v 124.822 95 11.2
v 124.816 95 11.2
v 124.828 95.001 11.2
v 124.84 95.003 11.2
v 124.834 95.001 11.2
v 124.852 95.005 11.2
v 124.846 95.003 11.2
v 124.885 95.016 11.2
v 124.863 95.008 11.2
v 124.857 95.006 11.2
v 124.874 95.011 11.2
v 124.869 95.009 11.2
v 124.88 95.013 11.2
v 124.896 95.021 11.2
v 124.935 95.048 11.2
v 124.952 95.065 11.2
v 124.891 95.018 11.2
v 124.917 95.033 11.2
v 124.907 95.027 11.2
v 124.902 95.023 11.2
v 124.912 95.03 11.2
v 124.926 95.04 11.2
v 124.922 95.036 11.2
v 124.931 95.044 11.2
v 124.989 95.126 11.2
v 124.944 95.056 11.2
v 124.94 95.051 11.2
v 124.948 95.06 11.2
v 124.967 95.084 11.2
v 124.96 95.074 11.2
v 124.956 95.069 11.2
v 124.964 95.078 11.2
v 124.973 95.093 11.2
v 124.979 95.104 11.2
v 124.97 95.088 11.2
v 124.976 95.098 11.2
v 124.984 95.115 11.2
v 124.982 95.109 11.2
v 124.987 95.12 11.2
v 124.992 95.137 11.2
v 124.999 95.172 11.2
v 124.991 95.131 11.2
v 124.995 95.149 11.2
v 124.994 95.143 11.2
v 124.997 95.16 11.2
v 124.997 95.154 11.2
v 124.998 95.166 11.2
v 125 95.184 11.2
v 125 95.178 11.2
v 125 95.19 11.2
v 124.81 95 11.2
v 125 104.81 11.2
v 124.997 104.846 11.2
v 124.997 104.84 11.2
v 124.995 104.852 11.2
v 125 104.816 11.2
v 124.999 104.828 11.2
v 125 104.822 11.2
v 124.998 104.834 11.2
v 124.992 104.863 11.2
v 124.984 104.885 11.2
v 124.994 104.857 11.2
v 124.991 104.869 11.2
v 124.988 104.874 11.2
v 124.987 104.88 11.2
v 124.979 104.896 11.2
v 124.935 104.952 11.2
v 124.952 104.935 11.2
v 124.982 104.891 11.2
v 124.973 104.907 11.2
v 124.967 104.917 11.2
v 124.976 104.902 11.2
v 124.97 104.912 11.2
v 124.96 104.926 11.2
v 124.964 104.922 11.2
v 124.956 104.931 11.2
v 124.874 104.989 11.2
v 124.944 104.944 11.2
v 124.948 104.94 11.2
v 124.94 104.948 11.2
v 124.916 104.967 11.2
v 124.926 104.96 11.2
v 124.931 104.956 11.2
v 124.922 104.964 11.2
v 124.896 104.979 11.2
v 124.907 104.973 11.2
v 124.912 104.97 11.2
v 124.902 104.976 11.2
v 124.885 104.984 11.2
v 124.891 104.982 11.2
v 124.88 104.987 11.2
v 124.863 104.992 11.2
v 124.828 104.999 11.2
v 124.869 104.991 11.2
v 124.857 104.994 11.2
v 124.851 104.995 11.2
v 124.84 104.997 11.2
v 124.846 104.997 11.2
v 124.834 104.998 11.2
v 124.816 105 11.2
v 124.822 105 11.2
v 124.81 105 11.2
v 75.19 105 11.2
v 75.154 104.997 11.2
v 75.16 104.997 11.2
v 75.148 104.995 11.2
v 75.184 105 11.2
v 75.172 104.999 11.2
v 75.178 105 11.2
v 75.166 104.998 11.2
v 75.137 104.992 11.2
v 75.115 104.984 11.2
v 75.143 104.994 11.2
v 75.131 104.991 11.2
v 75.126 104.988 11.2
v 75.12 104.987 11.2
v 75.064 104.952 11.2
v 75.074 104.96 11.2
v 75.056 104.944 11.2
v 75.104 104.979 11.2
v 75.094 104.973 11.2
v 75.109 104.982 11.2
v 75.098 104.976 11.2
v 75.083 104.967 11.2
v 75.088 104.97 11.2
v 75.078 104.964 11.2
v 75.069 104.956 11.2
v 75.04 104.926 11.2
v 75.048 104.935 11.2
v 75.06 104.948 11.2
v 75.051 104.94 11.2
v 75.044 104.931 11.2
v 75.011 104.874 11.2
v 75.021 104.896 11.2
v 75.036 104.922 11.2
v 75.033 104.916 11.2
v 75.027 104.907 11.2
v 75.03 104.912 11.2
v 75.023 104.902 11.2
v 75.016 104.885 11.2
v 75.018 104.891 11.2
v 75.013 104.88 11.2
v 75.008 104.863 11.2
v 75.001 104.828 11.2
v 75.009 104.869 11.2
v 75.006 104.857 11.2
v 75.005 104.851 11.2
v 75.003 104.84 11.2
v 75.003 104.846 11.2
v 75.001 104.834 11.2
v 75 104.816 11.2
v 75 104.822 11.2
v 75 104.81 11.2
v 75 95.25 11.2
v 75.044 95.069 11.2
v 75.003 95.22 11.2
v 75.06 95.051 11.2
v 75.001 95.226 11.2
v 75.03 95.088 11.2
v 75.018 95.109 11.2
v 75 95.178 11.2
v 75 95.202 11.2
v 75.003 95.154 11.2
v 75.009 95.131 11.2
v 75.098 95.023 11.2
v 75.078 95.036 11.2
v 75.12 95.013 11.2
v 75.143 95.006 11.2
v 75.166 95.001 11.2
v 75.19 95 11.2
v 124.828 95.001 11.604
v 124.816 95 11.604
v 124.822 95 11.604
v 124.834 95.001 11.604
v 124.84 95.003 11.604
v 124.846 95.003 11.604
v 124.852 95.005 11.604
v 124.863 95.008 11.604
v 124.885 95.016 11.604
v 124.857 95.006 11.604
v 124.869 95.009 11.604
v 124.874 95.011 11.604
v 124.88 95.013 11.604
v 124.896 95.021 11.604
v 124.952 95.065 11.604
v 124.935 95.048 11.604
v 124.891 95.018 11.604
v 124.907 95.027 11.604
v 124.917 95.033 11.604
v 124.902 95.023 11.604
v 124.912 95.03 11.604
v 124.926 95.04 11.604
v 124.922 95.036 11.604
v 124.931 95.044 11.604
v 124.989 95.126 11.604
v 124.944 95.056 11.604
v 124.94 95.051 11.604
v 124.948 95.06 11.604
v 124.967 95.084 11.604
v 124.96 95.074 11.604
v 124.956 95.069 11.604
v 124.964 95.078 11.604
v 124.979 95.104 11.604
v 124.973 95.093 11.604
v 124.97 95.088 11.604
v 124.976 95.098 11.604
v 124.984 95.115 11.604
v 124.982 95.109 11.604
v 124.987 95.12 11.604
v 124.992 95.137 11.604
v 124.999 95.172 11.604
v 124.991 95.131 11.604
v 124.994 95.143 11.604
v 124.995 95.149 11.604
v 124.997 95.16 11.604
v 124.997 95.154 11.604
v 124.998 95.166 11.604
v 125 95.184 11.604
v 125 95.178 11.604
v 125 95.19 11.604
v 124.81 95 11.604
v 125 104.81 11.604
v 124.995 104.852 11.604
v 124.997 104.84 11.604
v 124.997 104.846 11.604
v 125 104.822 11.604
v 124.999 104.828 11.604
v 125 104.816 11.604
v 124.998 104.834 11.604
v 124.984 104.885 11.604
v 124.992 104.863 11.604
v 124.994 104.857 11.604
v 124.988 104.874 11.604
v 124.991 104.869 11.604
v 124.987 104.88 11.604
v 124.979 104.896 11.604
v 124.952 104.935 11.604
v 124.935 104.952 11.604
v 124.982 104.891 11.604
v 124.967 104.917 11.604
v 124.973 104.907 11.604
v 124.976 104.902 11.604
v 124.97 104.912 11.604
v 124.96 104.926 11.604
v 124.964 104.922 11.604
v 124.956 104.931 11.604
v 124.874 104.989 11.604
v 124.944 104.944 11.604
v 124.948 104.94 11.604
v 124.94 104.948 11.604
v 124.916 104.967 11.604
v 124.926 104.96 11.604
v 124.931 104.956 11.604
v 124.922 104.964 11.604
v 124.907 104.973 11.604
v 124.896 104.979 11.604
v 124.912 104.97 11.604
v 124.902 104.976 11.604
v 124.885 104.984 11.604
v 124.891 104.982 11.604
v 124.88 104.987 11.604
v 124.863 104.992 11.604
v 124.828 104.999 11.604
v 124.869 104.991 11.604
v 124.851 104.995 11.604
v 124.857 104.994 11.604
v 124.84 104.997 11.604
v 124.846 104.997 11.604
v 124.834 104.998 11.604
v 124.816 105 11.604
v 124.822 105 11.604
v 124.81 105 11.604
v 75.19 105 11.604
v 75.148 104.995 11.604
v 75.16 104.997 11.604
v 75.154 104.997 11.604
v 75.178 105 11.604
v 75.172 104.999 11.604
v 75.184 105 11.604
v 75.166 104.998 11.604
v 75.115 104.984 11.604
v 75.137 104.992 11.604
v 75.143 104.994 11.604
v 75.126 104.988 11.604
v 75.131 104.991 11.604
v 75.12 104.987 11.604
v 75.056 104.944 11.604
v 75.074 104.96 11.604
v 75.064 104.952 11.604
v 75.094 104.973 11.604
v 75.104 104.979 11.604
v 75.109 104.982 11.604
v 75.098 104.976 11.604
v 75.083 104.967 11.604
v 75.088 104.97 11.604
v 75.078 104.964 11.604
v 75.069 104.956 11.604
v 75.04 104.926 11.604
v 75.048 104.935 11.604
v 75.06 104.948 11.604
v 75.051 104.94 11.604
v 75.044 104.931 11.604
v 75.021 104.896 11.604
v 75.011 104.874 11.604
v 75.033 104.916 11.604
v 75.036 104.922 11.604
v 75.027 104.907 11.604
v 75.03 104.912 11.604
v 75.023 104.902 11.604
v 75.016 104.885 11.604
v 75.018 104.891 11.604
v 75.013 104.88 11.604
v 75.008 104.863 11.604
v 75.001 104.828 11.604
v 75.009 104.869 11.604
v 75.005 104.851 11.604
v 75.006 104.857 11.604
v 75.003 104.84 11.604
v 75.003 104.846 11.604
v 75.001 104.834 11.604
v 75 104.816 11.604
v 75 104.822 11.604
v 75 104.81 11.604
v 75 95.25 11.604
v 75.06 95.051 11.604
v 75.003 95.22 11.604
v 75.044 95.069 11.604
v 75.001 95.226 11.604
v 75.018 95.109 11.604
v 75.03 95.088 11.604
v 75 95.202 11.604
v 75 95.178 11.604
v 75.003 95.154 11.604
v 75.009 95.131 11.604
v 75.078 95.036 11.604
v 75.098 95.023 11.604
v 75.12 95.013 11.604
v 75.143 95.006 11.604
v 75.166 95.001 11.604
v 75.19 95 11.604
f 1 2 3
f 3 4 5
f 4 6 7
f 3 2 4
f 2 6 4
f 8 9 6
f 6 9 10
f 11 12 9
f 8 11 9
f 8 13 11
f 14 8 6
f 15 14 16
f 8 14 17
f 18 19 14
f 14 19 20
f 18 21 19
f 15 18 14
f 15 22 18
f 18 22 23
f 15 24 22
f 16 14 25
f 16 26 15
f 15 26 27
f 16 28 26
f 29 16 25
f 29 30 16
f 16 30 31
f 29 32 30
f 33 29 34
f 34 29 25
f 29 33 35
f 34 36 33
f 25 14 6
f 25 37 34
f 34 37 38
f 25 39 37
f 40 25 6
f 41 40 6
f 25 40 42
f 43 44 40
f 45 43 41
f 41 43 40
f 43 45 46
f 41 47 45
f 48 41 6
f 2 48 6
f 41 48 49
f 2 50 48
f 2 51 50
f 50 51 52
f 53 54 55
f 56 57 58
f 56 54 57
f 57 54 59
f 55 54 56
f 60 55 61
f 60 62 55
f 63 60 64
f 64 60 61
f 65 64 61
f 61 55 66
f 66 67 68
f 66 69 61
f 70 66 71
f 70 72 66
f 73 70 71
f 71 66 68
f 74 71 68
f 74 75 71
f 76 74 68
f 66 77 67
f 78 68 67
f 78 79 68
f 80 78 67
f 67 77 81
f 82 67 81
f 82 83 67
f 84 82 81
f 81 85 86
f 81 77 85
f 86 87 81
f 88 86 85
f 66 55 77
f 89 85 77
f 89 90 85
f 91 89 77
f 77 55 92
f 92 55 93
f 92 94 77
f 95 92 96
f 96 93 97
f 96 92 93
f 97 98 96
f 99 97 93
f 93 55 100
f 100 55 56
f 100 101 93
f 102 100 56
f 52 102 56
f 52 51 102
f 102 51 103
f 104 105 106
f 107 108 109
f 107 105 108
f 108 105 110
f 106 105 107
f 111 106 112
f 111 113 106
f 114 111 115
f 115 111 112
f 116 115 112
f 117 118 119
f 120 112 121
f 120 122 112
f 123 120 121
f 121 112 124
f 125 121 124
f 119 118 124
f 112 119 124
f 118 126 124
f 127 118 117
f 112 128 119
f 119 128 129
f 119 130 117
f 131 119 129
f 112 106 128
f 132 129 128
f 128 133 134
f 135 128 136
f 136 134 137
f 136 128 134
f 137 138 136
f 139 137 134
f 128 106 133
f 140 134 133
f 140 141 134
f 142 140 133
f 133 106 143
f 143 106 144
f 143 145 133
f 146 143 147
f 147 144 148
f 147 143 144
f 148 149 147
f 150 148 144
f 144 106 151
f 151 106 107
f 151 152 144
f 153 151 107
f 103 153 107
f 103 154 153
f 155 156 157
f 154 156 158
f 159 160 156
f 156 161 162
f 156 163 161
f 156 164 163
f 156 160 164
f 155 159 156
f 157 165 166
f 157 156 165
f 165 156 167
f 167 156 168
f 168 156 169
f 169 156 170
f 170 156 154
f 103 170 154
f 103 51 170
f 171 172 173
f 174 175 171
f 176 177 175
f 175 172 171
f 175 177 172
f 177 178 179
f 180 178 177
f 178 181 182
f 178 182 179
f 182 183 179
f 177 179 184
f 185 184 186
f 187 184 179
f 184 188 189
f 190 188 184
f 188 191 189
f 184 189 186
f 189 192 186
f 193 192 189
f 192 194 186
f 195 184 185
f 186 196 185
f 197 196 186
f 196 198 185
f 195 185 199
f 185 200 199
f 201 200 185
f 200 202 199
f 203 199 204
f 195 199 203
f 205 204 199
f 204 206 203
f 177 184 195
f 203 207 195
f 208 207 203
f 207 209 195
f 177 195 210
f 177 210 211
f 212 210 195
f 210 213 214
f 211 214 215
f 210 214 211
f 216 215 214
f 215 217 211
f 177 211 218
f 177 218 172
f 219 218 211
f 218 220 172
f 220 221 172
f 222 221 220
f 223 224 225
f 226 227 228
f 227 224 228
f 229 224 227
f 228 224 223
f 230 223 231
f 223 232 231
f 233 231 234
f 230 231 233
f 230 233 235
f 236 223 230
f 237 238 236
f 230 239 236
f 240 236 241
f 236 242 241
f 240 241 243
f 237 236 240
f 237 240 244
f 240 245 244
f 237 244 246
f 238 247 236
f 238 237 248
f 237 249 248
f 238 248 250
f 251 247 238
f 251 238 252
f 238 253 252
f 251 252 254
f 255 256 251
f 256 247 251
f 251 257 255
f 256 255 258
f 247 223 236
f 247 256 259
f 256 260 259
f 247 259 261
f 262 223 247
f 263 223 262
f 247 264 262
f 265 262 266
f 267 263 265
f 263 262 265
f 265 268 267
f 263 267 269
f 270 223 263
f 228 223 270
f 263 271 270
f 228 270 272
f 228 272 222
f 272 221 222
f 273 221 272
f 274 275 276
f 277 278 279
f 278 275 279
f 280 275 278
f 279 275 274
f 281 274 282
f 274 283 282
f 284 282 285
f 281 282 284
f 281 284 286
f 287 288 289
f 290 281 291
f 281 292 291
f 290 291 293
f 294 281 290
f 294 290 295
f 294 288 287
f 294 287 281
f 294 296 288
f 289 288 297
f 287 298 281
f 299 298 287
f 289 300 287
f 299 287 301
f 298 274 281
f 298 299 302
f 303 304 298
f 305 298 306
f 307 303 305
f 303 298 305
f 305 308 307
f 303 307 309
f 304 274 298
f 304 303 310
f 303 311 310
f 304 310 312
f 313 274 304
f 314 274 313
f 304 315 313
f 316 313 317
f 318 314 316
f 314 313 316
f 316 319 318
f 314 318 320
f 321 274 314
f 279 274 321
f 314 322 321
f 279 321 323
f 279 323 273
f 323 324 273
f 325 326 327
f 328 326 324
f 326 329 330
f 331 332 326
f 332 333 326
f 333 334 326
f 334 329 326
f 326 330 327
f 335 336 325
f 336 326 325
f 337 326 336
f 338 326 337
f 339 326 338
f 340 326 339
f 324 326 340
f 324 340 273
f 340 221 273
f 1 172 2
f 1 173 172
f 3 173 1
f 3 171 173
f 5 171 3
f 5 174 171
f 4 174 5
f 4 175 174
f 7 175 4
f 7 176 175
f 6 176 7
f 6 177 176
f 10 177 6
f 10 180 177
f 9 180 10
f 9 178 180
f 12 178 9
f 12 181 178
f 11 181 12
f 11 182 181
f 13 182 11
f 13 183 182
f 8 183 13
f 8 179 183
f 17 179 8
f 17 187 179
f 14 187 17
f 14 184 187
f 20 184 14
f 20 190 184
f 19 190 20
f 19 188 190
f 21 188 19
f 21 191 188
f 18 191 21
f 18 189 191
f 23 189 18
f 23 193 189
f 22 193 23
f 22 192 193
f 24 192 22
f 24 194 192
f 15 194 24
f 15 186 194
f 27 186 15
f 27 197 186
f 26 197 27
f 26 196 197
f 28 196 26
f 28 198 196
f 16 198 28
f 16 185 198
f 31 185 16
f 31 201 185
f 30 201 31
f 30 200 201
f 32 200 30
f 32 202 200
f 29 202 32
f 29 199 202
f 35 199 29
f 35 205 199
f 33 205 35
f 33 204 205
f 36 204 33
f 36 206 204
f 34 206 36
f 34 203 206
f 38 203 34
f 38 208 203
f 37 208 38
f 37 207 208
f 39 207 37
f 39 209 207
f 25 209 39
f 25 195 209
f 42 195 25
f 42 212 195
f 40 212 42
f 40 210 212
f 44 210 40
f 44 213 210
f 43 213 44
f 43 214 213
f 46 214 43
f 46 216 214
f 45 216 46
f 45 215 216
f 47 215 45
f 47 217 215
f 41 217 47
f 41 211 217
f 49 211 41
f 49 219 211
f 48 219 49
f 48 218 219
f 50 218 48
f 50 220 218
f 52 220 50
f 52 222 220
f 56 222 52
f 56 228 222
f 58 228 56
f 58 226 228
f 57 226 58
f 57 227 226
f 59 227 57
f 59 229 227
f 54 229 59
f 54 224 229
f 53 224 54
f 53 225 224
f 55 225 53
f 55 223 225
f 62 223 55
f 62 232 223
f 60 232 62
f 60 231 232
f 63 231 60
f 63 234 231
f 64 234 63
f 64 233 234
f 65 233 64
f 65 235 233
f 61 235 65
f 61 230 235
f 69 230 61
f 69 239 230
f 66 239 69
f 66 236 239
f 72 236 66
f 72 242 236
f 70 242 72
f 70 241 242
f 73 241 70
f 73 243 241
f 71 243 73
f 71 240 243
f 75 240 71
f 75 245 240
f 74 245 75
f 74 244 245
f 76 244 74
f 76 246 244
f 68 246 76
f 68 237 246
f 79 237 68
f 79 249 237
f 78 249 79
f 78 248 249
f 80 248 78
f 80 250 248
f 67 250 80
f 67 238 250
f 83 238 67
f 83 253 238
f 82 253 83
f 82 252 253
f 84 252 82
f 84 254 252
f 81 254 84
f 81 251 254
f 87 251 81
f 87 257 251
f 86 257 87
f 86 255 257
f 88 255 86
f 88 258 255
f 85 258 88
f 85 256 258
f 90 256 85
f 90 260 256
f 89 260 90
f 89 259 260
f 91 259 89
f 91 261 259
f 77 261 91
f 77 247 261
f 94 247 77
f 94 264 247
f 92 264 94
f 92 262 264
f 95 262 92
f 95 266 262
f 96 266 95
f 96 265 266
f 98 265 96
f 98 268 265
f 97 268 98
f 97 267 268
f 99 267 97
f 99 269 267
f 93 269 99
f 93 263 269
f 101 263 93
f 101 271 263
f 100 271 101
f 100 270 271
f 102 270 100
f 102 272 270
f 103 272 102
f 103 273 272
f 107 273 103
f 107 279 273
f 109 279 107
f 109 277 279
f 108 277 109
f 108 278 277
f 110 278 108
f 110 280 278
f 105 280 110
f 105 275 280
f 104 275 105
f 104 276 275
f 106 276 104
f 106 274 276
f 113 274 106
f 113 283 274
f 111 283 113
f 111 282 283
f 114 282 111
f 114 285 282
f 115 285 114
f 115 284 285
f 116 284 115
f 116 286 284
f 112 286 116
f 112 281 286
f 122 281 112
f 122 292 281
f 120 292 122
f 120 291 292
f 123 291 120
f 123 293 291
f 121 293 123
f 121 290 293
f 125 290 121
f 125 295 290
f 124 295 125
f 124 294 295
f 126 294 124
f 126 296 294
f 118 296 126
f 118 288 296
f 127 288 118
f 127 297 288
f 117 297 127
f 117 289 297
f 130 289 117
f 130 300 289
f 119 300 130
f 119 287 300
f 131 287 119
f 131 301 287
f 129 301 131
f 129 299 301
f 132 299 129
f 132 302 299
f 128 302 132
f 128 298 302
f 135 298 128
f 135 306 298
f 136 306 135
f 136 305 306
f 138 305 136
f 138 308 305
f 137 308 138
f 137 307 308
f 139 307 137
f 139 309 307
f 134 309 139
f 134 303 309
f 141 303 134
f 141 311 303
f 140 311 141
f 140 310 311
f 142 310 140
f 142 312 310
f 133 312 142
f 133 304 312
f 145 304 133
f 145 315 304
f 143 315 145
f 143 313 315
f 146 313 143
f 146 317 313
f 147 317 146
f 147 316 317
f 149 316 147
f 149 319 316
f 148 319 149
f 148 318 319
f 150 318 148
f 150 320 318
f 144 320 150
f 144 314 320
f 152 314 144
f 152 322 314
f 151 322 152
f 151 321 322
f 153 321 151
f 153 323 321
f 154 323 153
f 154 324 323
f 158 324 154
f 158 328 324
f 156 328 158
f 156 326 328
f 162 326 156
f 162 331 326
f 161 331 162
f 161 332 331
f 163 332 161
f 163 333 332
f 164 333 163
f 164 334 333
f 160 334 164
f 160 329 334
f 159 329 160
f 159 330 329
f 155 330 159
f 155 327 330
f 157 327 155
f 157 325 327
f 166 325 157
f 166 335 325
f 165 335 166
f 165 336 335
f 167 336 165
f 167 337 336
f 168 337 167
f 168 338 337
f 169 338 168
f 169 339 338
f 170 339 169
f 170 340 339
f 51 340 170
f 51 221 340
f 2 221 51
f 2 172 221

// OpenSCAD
module drawBasicShape(x1, y1, x2, y2, width)
{
	length = sqrt((x1-x2)*(x1-x2) + (y1-y2)*(y1-y2));
	if (width!=0.0) {
		square(size = [width, length], center = false);
		translate([width/2.0, 0, 0]) circle(d=width);
		translate([width/2.0, length, 0]) circle(d=width);
	}
}

module translateAndRotate(x1, y1, x2, y2, width)
{
	if (width != 0.0) {
		angle = atan((y2-y1)/(x2-x1)) +270;
		if (x2>=x1) {
			translate([x1, y1, 0.0]) rotate([0.0, 0.0, angle]) translate([-width/2.0, 0.0, 0.0]) scale([1.0, 1.0, 1.0]) drawBasicShape(x1, y1, x2, y2, width);
		}
		else {
			translate([x1, y1, 0.0]) rotate([0.0, 0.0, angle+180]) translate([-width/2.0, 0.0, 0.0]) scale([1.0, 1.0, 1.0]) drawBasicShape(x1, y1, x2, y2, width);		}
	}
}

$fn=50;

points27 = [
[75.77800000, 95.77800000, 0.00000000],
[124.22200000, 95.77800000, 0.37999672],
[124.22200000, 104.22200000, 0.37997788],
[75.77800000, 104.22200000, 0.37999548],
[75.77800000, 95.83800000, 0.37998140],
[75.48400000, 95.48400000, 0.00000000],
[124.51600000, 95.48400000, 0.37999746],
[124.51600000, 104.51600000, 0.37998977],
[75.48400000, 104.51600000, 0.37999868],
[75.48400000, 95.54400000, 0.37998644],
[75.19000000, 95.19000000, 0.00000000],
[124.81000000, 95.19000000, 0.38000060],
[124.81000000, 104.81000000, 0.38000021],
[75.19000000, 104.81000000, 0.37999939],
[75.19000000, 95.25000000, 0.38000344],
[75.53600000, 95.39000000, 0.00000000],
[76.11100000, 95.94600000, 0.00000000],
[75.94600000, 96.11100000, 0.37935605],
[75.94600000, 96.52800000, 0.38015610],
[76.52800000, 95.94600000, 0.37989934],
[76.94500000, 95.94600000, 0.38001190],
[75.94600000, 96.94500000, 0.37994651],
[75.94600000, 97.36200000, 0.38001190],
[77.36200000, 95.94600000, 0.37999592],
[77.77900000, 95.94600000, 0.38001190],
[75.94600000, 97.77900000, 0.38002285],
[75.94600000, 98.19600000, 0.38001190],
[78.19600000, 95.94600000, 0.38000201],
[78.61300000, 95.94600000, 0.38001190],
[75.94600000, 98.61300000, 0.38001957],
[75.94600000, 99.03000000, 0.38001190],
[79.03000000, 95.94600000, 0.38001859],
[79.44700000, 95.94600000, 0.38015610],
[75.94600000, 99.44700000, 0.38001785],
[75.94600000, 99.86400000, 0.38001190],
[79.86400000, 95.94600000, 0.38002811],
[80.28100000, 95.94600000, 0.38001190],
[75.94600000, 100.28100000, 0.38002660],
[75.94600000, 100.69800000, 0.38015610],
[80.69800000, 95.94600000, 0.38002534],
[81.11500000, 95.94600000, 0.38001190],
[75.94600000, 101.11500000, 0.38003252],
[75.94600000, 101.53300000, 0.37930814],
[81.53300000, 95.94600000, 0.37997836],
[81.95000000, 95.94600000, 0.38001190],
[75.94600000, 101.95000000, 0.37998780],
[75.94600000, 102.36700000, 0.38001190],
[82.36700000, 95.94600000, 0.37998939],
[82.78400000, 95.94600000, 0.38001190],
[75.94600000, 102.78400000, 0.37999079],
[75.94600000, 103.20100000, 0.38001190],
[83.20100000, 95.94600000, 0.37999203],
[83.61800000, 95.94600000, 0.38015610],
[75.94600000, 103.61800000, 0.37999314],
[75.95600000, 104.02400000, 0.38048727],
[84.03500000, 95.94600000, 0.38000275],
[84.45200000, 95.94600000, 0.38001190],
[76.34400000, 104.05400000, 0.38000229],
[76.76100000, 104.05400000, 0.38015610],
[84.86900000, 95.94600000, 0.38000229],
[85.28600000, 95.94600000, 0.38001190],
[77.17800000, 104.05400000, 0.38000754],
[77.59500000, 104.05400000, 0.38001190],
[85.70300000, 95.94600000, 0.38000229],
[86.12000000, 95.94600000, 0.38015610],
[78.01200000, 104.05400000, 0.38000229],
[78.42900000, 104.05400000, 0.38001190],
[86.53700000, 95.94600000, 0.38000229],
[86.95400000, 95.94600000, 0.38015610],
[78.84600000, 104.05400000, 0.38000229],
[79.26300000, 104.05400000, 0.38001190],
[87.37100000, 95.94600000, 0.38000754],
[87.78900000, 95.94600000, 0.37930814],
[79.68000000, 104.05400000, 0.37998415],
[80.09700000, 104.05400000, 0.38001190],
[88.20600000, 95.94600000, 0.37998940],
[88.62300000, 95.94600000, 0.38001190],
[80.51500000, 104.05400000, 0.38000229],
[80.93200000, 104.05400000, 0.38015610],
[89.04000000, 95.94600000, 0.38000229],
[89.45700000, 95.94600000, 0.38001190],
[81.34900000, 104.05400000, 0.38000754],
[81.76600000, 104.05400000, 0.38001190],
[89.87400000, 95.94600000, 0.38000229],
[90.29100000, 95.94600000, 0.38001190],
[82.18300000, 104.05400000, 0.38000754],
[82.60000000, 104.05400000, 0.38001190],
[90.70800000, 95.94600000, 0.38000229],
[91.12500000, 95.94600000, 0.38015610],
[83.01700000, 104.05400000, 0.38000229],
[83.43400000, 104.05400000, 0.38001190],
[91.54200000, 95.94600000, 0.38000754],
[91.95900000, 95.94600000, 0.38001190],
[83.85100000, 104.05400000, 0.38000229],
[84.26800000, 104.05400000, 0.38001190],
[92.37600000, 95.94600000, 0.38000754],
[92.79300000, 95.94600000, 0.38001190],
[84.68500000, 104.05400000, 0.38000229],
[85.10200000, 104.05400000, 0.38015610],
[93.21000000, 95.94600000, 0.38000229],
[93.62700000, 95.94600000, 0.38001190],
[85.51900000, 104.05400000, 0.38000754],
[85.93600000, 104.05400000, 0.38001190],
[94.04400000, 95.94600000, 0.38000229],
[94.46200000, 95.94600000, 0.37930814],
[86.35300000, 104.05400000, 0.37998940],
[86.77000000, 104.05400000, 0.38001190],
[94.87900000, 95.94600000, 0.37998415],
[95.29600000, 95.94600000, 0.38015610],
[87.18800000, 104.05400000, 0.38000229],
[87.60500000, 104.05400000, 0.38001190],
[95.71300000, 95.94600000, 0.38000754],
[96.13000000, 95.94600000, 0.38001190],
[88.02200000, 104.05400000, 0.38000229],
[88.43900000, 104.05400000, 0.38001190],
[96.54700000, 95.94600000, 0.38000754],
[96.96400000, 95.94600000, 0.38001190],
[88.85600000, 104.05400000, 0.38000229],
[89.27300000, 104.05400000, 0.38015610],
[97.38100000, 95.94600000, 0.38000229],
[97.79800000, 95.94600000, 0.38001190],
[89.69000000, 104.05400000, 0.38000229],
[90.10700000, 104.05400000, 0.38015610],
[98.21500000, 95.94600000, 0.38000229],
[98.63200000, 95.94600000, 0.38001190],
[90.52400000, 104.05400000, 0.38000754],
[90.94100000, 104.05400000, 0.38001190],
[99.04900000, 95.94600000, 0.38000229],
[99.46600000, 95.94600000, 0.38015610],
[91.35800000, 104.05400000, 0.38000229],
[91.77500000, 104.05400000, 0.38001190],
[99.88300000, 95.94600000, 0.38000229],
[100.30000000, 95.94600000, 0.38015610],
[92.19200000, 104.05400000, 0.38000229],
[92.60900000, 104.05400000, 0.38001190],
[100.71800000, 95.94600000, 0.37998940],
[101.13500000, 95.94600000, 0.38001190],
[93.02600000, 104.05400000, 0.37998415],
[93.44400000, 104.05400000, 0.37945200],
[101.55200000, 95.94600000, 0.38000229],
[101.96900000, 95.94600000, 0.38001190],
[93.86100000, 104.05400000, 0.38000229],
[94.27800000, 104.05400000, 0.38015610],
[102.38600000, 95.94600000, 0.38000229],
[102.80300000, 95.94600000, 0.38001190],
[94.69500000, 104.05400000, 0.38000754],
[95.11200000, 104.05400000, 0.38001190],
[103.22000000, 95.94600000, 0.38000229],
[103.63700000, 95.94600000, 0.38015610],
[95.52900000, 104.05400000, 0.38000229],
[95.94600000, 104.05400000, 0.38001190],
[104.05400000, 95.94600000, 0.38000754],
[104.47100000, 95.94600000, 0.38001190],
[96.36300000, 104.05400000, 0.38000229],
[96.78000000, 104.05400000, 0.38001190],
[104.88800000, 95.94600000, 0.38000754],
[105.30500000, 95.94600000, 0.38001190],
[97.19700000, 104.05400000, 0.38000229],
[97.61400000, 104.05400000, 0.38015610],
[105.72200000, 95.94600000, 0.38000229],
[106.13900000, 95.94600000, 0.38001190],
[98.03100000, 104.05400000, 0.38000754],
[98.44800000, 104.05400000, 0.38001190],
[106.55600000, 95.94600000, 0.38000229],
[106.97300000, 95.94600000, 0.38001190],
[98.86500000, 104.05400000, 0.38000754],
[99.28200000, 104.05400000, 0.38001190],
[107.39100000, 95.94600000, 0.37998415],
[107.80800000, 95.94600000, 0.38015610],
[99.69900000, 104.05400000, 0.37998415],
[100.11700000, 104.05400000, 0.37930814],
[108.22500000, 95.94600000, 0.38000754],
[108.64200000, 95.94600000, 0.38001190],
[100.53400000, 104.05400000, 0.38000229],
[100.95100000, 104.05400000, 0.38001190],
[109.05900000, 95.94600000, 0.38000754],
[109.47600000, 95.94600000, 0.38001190],
[101.36800000, 104.05400000, 0.38000229],
[101.78500000, 104.05400000, 0.38015610],
[109.89300000, 95.94600000, 0.38000229],
[110.31000000, 95.94600000, 0.38001190],
[102.20200000, 104.05400000, 0.38000754],
[102.61900000, 104.05400000, 0.38001190],
[110.72700000, 95.94600000, 0.38000229],
[111.14400000, 95.94600000, 0.38001190],
[103.03600000, 104.05400000, 0.38000754],
[103.45300000, 104.05400000, 0.38001190],
[111.56100000, 95.94600000, 0.38000229],
[111.97800000, 95.94600000, 0.38015610],
[103.87000000, 104.05400000, 0.38000229],
[104.28700000, 104.05400000, 0.38001190],
[112.39500000, 95.94600000, 0.38000229],
[112.81200000, 95.94600000, 0.38015610],
[104.70400000, 104.05400000, 0.38000229],
[105.12100000, 104.05400000, 0.38001190],
[113.22900000, 95.94600000, 0.38000754],
[113.64700000, 95.94600000, 0.37930814],
[105.53800000, 104.05400000, 0.37998415],
[105.95500000, 104.05400000, 0.38015610],
[114.06400000, 95.94600000, 0.37998415],
[114.48100000, 95.94600000, 0.38001190],
[106.37300000, 104.05400000, 0.38000229],
[106.79000000, 104.05400000, 0.38015610],
[114.89800000, 95.94600000, 0.38000229],
[115.31500000, 95.94600000, 0.38001190],
[107.20700000, 104.05400000, 0.38000754],
[107.62400000, 104.05400000, 0.38001190],
[115.73200000, 95.94600000, 0.38000229],
[116.14900000, 95.94600000, 0.38015610],
[108.04100000, 104.05400000, 0.38000229],
[108.45800000, 104.05400000, 0.38001190],
[116.56600000, 95.94600000, 0.38000229],
[116.98300000, 95.94600000, 0.38015610],
[108.87500000, 104.05400000, 0.38000229],
[109.29200000, 104.05400000, 0.38001190],
[117.40000000, 95.94600000, 0.38000754],
[117.81700000, 95.94600000, 0.38001190],
[109.70900000, 104.05400000, 0.38000229],
[110.12600000, 104.05400000, 0.38015610],
[118.23400000, 95.94600000, 0.38000229],
[118.65100000, 95.94600000, 0.38001190],
[110.54300000, 104.05400000, 0.38000229],
[110.96000000, 104.05400000, 0.38015610],
[119.06800000, 95.94600000, 0.38000229],
[119.48500000, 95.94600000, 0.38001190],
[111.37700000, 104.05400000, 0.38000754],
[111.79400000, 104.05400000, 0.38001190],
[119.90200000, 95.94600000, 0.38000229],
[120.32000000, 95.94600000, 0.37930814],
[112.21100000, 104.05400000, 0.37998940],
[112.62900000, 104.05400000, 0.37930814],
[120.73700000, 95.94600000, 0.38000229],
[121.15400000, 95.94600000, 0.38015610],
[113.04600000, 104.05400000, 0.38000229],
[113.46300000, 104.05400000, 0.38001190],
[121.57100000, 95.94600000, 0.38000754],
[121.98800000, 95.94600000, 0.38001190],
[113.88000000, 104.05400000, 0.38000229],
[114.29700000, 104.05400000, 0.38001190],
[122.40500000, 95.94600000, 0.38000754],
[122.82200000, 95.94600000, 0.38001190],
[114.71400000, 104.05400000, 0.38000229],
[115.13100000, 104.05400000, 0.38015610],
[123.23900000, 95.94600000, 0.38000229],
[123.65600000, 95.94600000, 0.38001190],
[115.54800000, 104.05400000, 0.38000754],
[115.96500000, 104.05400000, 0.38001190],
[124.04400000, 95.97500000, 0.37998455],
[124.05400000, 96.38200000, 0.37976376],
[116.38200000, 104.05400000, 0.37999868],
[116.79900000, 104.05400000, 0.38001190],
[124.05400000, 96.79900000, 0.37999789],
[124.05400000, 97.21600000, 0.38001190],
[117.21600000, 104.05400000, 0.37999079],
[117.63300000, 104.05400000, 0.38001190],
[124.05400000, 97.63300000, 0.37998939],
[124.05400000, 98.05000000, 0.38015610],
[118.05000000, 104.05400000, 0.37998072],
[118.46700000, 104.05400000, 0.38015610],
[124.05400000, 98.46700000, 0.37997836],
[124.05400000, 98.88400000, 0.38001190],
[118.88400000, 104.05400000, 0.37997562],
[119.30200000, 104.05400000, 0.37930814],
[124.05400000, 99.30200000, 0.38003429],
[124.05400000, 99.71900000, 0.38001190],
[119.71900000, 104.05400000, 0.38003640],
[120.13600000, 104.05400000, 0.38001190],
[124.05400000, 100.13600000, 0.38002811],
[124.05400000, 100.55300000, 0.38001190],
[120.55300000, 104.05400000, 0.38002999],
[120.97000000, 104.05400000, 0.38001190],
[124.05400000, 100.97000000, 0.38003238],
[124.05400000, 101.38700000, 0.38001190],
[121.38700000, 104.05400000, 0.38001957],
[121.80400000, 104.05400000, 0.38001190],
[124.05400000, 101.80400000, 0.38002091],
[124.05400000, 102.22100000, 0.38001190],
[122.22100000, 104.05400000, 0.38002285],
[122.63800000, 104.05400000, 0.38001190],
[124.05400000, 102.63800000, 0.37999592],
[124.05400000, 103.05500000, 0.38001190],
[123.05500000, 104.05400000, 0.37998907],
[123.47200000, 104.05400000, 0.38001190],
[124.05400000, 103.47200000, 0.37997240],
[124.05400000, 103.88900000, 0.38001190],
[123.88900000, 104.05400000, 0.37961375],
];

translate([0.0, 0.0, 11.20000000]) {
	linear_extrude(height = 0.40400000, center = false, convexity = 10, twist = 0) {
		union() {
			for( i=[0:len(points27)-2] ){ 
				x1 = points27[i][0];
				y1 = points27[i][1];
				x2 = points27[i+1][0];
				y2 = points27[i+1][1];
				width = points27[i+1][2];
				translateAndRotate(x1, y1, x2, y2, width);
			}
		}
	}
}
